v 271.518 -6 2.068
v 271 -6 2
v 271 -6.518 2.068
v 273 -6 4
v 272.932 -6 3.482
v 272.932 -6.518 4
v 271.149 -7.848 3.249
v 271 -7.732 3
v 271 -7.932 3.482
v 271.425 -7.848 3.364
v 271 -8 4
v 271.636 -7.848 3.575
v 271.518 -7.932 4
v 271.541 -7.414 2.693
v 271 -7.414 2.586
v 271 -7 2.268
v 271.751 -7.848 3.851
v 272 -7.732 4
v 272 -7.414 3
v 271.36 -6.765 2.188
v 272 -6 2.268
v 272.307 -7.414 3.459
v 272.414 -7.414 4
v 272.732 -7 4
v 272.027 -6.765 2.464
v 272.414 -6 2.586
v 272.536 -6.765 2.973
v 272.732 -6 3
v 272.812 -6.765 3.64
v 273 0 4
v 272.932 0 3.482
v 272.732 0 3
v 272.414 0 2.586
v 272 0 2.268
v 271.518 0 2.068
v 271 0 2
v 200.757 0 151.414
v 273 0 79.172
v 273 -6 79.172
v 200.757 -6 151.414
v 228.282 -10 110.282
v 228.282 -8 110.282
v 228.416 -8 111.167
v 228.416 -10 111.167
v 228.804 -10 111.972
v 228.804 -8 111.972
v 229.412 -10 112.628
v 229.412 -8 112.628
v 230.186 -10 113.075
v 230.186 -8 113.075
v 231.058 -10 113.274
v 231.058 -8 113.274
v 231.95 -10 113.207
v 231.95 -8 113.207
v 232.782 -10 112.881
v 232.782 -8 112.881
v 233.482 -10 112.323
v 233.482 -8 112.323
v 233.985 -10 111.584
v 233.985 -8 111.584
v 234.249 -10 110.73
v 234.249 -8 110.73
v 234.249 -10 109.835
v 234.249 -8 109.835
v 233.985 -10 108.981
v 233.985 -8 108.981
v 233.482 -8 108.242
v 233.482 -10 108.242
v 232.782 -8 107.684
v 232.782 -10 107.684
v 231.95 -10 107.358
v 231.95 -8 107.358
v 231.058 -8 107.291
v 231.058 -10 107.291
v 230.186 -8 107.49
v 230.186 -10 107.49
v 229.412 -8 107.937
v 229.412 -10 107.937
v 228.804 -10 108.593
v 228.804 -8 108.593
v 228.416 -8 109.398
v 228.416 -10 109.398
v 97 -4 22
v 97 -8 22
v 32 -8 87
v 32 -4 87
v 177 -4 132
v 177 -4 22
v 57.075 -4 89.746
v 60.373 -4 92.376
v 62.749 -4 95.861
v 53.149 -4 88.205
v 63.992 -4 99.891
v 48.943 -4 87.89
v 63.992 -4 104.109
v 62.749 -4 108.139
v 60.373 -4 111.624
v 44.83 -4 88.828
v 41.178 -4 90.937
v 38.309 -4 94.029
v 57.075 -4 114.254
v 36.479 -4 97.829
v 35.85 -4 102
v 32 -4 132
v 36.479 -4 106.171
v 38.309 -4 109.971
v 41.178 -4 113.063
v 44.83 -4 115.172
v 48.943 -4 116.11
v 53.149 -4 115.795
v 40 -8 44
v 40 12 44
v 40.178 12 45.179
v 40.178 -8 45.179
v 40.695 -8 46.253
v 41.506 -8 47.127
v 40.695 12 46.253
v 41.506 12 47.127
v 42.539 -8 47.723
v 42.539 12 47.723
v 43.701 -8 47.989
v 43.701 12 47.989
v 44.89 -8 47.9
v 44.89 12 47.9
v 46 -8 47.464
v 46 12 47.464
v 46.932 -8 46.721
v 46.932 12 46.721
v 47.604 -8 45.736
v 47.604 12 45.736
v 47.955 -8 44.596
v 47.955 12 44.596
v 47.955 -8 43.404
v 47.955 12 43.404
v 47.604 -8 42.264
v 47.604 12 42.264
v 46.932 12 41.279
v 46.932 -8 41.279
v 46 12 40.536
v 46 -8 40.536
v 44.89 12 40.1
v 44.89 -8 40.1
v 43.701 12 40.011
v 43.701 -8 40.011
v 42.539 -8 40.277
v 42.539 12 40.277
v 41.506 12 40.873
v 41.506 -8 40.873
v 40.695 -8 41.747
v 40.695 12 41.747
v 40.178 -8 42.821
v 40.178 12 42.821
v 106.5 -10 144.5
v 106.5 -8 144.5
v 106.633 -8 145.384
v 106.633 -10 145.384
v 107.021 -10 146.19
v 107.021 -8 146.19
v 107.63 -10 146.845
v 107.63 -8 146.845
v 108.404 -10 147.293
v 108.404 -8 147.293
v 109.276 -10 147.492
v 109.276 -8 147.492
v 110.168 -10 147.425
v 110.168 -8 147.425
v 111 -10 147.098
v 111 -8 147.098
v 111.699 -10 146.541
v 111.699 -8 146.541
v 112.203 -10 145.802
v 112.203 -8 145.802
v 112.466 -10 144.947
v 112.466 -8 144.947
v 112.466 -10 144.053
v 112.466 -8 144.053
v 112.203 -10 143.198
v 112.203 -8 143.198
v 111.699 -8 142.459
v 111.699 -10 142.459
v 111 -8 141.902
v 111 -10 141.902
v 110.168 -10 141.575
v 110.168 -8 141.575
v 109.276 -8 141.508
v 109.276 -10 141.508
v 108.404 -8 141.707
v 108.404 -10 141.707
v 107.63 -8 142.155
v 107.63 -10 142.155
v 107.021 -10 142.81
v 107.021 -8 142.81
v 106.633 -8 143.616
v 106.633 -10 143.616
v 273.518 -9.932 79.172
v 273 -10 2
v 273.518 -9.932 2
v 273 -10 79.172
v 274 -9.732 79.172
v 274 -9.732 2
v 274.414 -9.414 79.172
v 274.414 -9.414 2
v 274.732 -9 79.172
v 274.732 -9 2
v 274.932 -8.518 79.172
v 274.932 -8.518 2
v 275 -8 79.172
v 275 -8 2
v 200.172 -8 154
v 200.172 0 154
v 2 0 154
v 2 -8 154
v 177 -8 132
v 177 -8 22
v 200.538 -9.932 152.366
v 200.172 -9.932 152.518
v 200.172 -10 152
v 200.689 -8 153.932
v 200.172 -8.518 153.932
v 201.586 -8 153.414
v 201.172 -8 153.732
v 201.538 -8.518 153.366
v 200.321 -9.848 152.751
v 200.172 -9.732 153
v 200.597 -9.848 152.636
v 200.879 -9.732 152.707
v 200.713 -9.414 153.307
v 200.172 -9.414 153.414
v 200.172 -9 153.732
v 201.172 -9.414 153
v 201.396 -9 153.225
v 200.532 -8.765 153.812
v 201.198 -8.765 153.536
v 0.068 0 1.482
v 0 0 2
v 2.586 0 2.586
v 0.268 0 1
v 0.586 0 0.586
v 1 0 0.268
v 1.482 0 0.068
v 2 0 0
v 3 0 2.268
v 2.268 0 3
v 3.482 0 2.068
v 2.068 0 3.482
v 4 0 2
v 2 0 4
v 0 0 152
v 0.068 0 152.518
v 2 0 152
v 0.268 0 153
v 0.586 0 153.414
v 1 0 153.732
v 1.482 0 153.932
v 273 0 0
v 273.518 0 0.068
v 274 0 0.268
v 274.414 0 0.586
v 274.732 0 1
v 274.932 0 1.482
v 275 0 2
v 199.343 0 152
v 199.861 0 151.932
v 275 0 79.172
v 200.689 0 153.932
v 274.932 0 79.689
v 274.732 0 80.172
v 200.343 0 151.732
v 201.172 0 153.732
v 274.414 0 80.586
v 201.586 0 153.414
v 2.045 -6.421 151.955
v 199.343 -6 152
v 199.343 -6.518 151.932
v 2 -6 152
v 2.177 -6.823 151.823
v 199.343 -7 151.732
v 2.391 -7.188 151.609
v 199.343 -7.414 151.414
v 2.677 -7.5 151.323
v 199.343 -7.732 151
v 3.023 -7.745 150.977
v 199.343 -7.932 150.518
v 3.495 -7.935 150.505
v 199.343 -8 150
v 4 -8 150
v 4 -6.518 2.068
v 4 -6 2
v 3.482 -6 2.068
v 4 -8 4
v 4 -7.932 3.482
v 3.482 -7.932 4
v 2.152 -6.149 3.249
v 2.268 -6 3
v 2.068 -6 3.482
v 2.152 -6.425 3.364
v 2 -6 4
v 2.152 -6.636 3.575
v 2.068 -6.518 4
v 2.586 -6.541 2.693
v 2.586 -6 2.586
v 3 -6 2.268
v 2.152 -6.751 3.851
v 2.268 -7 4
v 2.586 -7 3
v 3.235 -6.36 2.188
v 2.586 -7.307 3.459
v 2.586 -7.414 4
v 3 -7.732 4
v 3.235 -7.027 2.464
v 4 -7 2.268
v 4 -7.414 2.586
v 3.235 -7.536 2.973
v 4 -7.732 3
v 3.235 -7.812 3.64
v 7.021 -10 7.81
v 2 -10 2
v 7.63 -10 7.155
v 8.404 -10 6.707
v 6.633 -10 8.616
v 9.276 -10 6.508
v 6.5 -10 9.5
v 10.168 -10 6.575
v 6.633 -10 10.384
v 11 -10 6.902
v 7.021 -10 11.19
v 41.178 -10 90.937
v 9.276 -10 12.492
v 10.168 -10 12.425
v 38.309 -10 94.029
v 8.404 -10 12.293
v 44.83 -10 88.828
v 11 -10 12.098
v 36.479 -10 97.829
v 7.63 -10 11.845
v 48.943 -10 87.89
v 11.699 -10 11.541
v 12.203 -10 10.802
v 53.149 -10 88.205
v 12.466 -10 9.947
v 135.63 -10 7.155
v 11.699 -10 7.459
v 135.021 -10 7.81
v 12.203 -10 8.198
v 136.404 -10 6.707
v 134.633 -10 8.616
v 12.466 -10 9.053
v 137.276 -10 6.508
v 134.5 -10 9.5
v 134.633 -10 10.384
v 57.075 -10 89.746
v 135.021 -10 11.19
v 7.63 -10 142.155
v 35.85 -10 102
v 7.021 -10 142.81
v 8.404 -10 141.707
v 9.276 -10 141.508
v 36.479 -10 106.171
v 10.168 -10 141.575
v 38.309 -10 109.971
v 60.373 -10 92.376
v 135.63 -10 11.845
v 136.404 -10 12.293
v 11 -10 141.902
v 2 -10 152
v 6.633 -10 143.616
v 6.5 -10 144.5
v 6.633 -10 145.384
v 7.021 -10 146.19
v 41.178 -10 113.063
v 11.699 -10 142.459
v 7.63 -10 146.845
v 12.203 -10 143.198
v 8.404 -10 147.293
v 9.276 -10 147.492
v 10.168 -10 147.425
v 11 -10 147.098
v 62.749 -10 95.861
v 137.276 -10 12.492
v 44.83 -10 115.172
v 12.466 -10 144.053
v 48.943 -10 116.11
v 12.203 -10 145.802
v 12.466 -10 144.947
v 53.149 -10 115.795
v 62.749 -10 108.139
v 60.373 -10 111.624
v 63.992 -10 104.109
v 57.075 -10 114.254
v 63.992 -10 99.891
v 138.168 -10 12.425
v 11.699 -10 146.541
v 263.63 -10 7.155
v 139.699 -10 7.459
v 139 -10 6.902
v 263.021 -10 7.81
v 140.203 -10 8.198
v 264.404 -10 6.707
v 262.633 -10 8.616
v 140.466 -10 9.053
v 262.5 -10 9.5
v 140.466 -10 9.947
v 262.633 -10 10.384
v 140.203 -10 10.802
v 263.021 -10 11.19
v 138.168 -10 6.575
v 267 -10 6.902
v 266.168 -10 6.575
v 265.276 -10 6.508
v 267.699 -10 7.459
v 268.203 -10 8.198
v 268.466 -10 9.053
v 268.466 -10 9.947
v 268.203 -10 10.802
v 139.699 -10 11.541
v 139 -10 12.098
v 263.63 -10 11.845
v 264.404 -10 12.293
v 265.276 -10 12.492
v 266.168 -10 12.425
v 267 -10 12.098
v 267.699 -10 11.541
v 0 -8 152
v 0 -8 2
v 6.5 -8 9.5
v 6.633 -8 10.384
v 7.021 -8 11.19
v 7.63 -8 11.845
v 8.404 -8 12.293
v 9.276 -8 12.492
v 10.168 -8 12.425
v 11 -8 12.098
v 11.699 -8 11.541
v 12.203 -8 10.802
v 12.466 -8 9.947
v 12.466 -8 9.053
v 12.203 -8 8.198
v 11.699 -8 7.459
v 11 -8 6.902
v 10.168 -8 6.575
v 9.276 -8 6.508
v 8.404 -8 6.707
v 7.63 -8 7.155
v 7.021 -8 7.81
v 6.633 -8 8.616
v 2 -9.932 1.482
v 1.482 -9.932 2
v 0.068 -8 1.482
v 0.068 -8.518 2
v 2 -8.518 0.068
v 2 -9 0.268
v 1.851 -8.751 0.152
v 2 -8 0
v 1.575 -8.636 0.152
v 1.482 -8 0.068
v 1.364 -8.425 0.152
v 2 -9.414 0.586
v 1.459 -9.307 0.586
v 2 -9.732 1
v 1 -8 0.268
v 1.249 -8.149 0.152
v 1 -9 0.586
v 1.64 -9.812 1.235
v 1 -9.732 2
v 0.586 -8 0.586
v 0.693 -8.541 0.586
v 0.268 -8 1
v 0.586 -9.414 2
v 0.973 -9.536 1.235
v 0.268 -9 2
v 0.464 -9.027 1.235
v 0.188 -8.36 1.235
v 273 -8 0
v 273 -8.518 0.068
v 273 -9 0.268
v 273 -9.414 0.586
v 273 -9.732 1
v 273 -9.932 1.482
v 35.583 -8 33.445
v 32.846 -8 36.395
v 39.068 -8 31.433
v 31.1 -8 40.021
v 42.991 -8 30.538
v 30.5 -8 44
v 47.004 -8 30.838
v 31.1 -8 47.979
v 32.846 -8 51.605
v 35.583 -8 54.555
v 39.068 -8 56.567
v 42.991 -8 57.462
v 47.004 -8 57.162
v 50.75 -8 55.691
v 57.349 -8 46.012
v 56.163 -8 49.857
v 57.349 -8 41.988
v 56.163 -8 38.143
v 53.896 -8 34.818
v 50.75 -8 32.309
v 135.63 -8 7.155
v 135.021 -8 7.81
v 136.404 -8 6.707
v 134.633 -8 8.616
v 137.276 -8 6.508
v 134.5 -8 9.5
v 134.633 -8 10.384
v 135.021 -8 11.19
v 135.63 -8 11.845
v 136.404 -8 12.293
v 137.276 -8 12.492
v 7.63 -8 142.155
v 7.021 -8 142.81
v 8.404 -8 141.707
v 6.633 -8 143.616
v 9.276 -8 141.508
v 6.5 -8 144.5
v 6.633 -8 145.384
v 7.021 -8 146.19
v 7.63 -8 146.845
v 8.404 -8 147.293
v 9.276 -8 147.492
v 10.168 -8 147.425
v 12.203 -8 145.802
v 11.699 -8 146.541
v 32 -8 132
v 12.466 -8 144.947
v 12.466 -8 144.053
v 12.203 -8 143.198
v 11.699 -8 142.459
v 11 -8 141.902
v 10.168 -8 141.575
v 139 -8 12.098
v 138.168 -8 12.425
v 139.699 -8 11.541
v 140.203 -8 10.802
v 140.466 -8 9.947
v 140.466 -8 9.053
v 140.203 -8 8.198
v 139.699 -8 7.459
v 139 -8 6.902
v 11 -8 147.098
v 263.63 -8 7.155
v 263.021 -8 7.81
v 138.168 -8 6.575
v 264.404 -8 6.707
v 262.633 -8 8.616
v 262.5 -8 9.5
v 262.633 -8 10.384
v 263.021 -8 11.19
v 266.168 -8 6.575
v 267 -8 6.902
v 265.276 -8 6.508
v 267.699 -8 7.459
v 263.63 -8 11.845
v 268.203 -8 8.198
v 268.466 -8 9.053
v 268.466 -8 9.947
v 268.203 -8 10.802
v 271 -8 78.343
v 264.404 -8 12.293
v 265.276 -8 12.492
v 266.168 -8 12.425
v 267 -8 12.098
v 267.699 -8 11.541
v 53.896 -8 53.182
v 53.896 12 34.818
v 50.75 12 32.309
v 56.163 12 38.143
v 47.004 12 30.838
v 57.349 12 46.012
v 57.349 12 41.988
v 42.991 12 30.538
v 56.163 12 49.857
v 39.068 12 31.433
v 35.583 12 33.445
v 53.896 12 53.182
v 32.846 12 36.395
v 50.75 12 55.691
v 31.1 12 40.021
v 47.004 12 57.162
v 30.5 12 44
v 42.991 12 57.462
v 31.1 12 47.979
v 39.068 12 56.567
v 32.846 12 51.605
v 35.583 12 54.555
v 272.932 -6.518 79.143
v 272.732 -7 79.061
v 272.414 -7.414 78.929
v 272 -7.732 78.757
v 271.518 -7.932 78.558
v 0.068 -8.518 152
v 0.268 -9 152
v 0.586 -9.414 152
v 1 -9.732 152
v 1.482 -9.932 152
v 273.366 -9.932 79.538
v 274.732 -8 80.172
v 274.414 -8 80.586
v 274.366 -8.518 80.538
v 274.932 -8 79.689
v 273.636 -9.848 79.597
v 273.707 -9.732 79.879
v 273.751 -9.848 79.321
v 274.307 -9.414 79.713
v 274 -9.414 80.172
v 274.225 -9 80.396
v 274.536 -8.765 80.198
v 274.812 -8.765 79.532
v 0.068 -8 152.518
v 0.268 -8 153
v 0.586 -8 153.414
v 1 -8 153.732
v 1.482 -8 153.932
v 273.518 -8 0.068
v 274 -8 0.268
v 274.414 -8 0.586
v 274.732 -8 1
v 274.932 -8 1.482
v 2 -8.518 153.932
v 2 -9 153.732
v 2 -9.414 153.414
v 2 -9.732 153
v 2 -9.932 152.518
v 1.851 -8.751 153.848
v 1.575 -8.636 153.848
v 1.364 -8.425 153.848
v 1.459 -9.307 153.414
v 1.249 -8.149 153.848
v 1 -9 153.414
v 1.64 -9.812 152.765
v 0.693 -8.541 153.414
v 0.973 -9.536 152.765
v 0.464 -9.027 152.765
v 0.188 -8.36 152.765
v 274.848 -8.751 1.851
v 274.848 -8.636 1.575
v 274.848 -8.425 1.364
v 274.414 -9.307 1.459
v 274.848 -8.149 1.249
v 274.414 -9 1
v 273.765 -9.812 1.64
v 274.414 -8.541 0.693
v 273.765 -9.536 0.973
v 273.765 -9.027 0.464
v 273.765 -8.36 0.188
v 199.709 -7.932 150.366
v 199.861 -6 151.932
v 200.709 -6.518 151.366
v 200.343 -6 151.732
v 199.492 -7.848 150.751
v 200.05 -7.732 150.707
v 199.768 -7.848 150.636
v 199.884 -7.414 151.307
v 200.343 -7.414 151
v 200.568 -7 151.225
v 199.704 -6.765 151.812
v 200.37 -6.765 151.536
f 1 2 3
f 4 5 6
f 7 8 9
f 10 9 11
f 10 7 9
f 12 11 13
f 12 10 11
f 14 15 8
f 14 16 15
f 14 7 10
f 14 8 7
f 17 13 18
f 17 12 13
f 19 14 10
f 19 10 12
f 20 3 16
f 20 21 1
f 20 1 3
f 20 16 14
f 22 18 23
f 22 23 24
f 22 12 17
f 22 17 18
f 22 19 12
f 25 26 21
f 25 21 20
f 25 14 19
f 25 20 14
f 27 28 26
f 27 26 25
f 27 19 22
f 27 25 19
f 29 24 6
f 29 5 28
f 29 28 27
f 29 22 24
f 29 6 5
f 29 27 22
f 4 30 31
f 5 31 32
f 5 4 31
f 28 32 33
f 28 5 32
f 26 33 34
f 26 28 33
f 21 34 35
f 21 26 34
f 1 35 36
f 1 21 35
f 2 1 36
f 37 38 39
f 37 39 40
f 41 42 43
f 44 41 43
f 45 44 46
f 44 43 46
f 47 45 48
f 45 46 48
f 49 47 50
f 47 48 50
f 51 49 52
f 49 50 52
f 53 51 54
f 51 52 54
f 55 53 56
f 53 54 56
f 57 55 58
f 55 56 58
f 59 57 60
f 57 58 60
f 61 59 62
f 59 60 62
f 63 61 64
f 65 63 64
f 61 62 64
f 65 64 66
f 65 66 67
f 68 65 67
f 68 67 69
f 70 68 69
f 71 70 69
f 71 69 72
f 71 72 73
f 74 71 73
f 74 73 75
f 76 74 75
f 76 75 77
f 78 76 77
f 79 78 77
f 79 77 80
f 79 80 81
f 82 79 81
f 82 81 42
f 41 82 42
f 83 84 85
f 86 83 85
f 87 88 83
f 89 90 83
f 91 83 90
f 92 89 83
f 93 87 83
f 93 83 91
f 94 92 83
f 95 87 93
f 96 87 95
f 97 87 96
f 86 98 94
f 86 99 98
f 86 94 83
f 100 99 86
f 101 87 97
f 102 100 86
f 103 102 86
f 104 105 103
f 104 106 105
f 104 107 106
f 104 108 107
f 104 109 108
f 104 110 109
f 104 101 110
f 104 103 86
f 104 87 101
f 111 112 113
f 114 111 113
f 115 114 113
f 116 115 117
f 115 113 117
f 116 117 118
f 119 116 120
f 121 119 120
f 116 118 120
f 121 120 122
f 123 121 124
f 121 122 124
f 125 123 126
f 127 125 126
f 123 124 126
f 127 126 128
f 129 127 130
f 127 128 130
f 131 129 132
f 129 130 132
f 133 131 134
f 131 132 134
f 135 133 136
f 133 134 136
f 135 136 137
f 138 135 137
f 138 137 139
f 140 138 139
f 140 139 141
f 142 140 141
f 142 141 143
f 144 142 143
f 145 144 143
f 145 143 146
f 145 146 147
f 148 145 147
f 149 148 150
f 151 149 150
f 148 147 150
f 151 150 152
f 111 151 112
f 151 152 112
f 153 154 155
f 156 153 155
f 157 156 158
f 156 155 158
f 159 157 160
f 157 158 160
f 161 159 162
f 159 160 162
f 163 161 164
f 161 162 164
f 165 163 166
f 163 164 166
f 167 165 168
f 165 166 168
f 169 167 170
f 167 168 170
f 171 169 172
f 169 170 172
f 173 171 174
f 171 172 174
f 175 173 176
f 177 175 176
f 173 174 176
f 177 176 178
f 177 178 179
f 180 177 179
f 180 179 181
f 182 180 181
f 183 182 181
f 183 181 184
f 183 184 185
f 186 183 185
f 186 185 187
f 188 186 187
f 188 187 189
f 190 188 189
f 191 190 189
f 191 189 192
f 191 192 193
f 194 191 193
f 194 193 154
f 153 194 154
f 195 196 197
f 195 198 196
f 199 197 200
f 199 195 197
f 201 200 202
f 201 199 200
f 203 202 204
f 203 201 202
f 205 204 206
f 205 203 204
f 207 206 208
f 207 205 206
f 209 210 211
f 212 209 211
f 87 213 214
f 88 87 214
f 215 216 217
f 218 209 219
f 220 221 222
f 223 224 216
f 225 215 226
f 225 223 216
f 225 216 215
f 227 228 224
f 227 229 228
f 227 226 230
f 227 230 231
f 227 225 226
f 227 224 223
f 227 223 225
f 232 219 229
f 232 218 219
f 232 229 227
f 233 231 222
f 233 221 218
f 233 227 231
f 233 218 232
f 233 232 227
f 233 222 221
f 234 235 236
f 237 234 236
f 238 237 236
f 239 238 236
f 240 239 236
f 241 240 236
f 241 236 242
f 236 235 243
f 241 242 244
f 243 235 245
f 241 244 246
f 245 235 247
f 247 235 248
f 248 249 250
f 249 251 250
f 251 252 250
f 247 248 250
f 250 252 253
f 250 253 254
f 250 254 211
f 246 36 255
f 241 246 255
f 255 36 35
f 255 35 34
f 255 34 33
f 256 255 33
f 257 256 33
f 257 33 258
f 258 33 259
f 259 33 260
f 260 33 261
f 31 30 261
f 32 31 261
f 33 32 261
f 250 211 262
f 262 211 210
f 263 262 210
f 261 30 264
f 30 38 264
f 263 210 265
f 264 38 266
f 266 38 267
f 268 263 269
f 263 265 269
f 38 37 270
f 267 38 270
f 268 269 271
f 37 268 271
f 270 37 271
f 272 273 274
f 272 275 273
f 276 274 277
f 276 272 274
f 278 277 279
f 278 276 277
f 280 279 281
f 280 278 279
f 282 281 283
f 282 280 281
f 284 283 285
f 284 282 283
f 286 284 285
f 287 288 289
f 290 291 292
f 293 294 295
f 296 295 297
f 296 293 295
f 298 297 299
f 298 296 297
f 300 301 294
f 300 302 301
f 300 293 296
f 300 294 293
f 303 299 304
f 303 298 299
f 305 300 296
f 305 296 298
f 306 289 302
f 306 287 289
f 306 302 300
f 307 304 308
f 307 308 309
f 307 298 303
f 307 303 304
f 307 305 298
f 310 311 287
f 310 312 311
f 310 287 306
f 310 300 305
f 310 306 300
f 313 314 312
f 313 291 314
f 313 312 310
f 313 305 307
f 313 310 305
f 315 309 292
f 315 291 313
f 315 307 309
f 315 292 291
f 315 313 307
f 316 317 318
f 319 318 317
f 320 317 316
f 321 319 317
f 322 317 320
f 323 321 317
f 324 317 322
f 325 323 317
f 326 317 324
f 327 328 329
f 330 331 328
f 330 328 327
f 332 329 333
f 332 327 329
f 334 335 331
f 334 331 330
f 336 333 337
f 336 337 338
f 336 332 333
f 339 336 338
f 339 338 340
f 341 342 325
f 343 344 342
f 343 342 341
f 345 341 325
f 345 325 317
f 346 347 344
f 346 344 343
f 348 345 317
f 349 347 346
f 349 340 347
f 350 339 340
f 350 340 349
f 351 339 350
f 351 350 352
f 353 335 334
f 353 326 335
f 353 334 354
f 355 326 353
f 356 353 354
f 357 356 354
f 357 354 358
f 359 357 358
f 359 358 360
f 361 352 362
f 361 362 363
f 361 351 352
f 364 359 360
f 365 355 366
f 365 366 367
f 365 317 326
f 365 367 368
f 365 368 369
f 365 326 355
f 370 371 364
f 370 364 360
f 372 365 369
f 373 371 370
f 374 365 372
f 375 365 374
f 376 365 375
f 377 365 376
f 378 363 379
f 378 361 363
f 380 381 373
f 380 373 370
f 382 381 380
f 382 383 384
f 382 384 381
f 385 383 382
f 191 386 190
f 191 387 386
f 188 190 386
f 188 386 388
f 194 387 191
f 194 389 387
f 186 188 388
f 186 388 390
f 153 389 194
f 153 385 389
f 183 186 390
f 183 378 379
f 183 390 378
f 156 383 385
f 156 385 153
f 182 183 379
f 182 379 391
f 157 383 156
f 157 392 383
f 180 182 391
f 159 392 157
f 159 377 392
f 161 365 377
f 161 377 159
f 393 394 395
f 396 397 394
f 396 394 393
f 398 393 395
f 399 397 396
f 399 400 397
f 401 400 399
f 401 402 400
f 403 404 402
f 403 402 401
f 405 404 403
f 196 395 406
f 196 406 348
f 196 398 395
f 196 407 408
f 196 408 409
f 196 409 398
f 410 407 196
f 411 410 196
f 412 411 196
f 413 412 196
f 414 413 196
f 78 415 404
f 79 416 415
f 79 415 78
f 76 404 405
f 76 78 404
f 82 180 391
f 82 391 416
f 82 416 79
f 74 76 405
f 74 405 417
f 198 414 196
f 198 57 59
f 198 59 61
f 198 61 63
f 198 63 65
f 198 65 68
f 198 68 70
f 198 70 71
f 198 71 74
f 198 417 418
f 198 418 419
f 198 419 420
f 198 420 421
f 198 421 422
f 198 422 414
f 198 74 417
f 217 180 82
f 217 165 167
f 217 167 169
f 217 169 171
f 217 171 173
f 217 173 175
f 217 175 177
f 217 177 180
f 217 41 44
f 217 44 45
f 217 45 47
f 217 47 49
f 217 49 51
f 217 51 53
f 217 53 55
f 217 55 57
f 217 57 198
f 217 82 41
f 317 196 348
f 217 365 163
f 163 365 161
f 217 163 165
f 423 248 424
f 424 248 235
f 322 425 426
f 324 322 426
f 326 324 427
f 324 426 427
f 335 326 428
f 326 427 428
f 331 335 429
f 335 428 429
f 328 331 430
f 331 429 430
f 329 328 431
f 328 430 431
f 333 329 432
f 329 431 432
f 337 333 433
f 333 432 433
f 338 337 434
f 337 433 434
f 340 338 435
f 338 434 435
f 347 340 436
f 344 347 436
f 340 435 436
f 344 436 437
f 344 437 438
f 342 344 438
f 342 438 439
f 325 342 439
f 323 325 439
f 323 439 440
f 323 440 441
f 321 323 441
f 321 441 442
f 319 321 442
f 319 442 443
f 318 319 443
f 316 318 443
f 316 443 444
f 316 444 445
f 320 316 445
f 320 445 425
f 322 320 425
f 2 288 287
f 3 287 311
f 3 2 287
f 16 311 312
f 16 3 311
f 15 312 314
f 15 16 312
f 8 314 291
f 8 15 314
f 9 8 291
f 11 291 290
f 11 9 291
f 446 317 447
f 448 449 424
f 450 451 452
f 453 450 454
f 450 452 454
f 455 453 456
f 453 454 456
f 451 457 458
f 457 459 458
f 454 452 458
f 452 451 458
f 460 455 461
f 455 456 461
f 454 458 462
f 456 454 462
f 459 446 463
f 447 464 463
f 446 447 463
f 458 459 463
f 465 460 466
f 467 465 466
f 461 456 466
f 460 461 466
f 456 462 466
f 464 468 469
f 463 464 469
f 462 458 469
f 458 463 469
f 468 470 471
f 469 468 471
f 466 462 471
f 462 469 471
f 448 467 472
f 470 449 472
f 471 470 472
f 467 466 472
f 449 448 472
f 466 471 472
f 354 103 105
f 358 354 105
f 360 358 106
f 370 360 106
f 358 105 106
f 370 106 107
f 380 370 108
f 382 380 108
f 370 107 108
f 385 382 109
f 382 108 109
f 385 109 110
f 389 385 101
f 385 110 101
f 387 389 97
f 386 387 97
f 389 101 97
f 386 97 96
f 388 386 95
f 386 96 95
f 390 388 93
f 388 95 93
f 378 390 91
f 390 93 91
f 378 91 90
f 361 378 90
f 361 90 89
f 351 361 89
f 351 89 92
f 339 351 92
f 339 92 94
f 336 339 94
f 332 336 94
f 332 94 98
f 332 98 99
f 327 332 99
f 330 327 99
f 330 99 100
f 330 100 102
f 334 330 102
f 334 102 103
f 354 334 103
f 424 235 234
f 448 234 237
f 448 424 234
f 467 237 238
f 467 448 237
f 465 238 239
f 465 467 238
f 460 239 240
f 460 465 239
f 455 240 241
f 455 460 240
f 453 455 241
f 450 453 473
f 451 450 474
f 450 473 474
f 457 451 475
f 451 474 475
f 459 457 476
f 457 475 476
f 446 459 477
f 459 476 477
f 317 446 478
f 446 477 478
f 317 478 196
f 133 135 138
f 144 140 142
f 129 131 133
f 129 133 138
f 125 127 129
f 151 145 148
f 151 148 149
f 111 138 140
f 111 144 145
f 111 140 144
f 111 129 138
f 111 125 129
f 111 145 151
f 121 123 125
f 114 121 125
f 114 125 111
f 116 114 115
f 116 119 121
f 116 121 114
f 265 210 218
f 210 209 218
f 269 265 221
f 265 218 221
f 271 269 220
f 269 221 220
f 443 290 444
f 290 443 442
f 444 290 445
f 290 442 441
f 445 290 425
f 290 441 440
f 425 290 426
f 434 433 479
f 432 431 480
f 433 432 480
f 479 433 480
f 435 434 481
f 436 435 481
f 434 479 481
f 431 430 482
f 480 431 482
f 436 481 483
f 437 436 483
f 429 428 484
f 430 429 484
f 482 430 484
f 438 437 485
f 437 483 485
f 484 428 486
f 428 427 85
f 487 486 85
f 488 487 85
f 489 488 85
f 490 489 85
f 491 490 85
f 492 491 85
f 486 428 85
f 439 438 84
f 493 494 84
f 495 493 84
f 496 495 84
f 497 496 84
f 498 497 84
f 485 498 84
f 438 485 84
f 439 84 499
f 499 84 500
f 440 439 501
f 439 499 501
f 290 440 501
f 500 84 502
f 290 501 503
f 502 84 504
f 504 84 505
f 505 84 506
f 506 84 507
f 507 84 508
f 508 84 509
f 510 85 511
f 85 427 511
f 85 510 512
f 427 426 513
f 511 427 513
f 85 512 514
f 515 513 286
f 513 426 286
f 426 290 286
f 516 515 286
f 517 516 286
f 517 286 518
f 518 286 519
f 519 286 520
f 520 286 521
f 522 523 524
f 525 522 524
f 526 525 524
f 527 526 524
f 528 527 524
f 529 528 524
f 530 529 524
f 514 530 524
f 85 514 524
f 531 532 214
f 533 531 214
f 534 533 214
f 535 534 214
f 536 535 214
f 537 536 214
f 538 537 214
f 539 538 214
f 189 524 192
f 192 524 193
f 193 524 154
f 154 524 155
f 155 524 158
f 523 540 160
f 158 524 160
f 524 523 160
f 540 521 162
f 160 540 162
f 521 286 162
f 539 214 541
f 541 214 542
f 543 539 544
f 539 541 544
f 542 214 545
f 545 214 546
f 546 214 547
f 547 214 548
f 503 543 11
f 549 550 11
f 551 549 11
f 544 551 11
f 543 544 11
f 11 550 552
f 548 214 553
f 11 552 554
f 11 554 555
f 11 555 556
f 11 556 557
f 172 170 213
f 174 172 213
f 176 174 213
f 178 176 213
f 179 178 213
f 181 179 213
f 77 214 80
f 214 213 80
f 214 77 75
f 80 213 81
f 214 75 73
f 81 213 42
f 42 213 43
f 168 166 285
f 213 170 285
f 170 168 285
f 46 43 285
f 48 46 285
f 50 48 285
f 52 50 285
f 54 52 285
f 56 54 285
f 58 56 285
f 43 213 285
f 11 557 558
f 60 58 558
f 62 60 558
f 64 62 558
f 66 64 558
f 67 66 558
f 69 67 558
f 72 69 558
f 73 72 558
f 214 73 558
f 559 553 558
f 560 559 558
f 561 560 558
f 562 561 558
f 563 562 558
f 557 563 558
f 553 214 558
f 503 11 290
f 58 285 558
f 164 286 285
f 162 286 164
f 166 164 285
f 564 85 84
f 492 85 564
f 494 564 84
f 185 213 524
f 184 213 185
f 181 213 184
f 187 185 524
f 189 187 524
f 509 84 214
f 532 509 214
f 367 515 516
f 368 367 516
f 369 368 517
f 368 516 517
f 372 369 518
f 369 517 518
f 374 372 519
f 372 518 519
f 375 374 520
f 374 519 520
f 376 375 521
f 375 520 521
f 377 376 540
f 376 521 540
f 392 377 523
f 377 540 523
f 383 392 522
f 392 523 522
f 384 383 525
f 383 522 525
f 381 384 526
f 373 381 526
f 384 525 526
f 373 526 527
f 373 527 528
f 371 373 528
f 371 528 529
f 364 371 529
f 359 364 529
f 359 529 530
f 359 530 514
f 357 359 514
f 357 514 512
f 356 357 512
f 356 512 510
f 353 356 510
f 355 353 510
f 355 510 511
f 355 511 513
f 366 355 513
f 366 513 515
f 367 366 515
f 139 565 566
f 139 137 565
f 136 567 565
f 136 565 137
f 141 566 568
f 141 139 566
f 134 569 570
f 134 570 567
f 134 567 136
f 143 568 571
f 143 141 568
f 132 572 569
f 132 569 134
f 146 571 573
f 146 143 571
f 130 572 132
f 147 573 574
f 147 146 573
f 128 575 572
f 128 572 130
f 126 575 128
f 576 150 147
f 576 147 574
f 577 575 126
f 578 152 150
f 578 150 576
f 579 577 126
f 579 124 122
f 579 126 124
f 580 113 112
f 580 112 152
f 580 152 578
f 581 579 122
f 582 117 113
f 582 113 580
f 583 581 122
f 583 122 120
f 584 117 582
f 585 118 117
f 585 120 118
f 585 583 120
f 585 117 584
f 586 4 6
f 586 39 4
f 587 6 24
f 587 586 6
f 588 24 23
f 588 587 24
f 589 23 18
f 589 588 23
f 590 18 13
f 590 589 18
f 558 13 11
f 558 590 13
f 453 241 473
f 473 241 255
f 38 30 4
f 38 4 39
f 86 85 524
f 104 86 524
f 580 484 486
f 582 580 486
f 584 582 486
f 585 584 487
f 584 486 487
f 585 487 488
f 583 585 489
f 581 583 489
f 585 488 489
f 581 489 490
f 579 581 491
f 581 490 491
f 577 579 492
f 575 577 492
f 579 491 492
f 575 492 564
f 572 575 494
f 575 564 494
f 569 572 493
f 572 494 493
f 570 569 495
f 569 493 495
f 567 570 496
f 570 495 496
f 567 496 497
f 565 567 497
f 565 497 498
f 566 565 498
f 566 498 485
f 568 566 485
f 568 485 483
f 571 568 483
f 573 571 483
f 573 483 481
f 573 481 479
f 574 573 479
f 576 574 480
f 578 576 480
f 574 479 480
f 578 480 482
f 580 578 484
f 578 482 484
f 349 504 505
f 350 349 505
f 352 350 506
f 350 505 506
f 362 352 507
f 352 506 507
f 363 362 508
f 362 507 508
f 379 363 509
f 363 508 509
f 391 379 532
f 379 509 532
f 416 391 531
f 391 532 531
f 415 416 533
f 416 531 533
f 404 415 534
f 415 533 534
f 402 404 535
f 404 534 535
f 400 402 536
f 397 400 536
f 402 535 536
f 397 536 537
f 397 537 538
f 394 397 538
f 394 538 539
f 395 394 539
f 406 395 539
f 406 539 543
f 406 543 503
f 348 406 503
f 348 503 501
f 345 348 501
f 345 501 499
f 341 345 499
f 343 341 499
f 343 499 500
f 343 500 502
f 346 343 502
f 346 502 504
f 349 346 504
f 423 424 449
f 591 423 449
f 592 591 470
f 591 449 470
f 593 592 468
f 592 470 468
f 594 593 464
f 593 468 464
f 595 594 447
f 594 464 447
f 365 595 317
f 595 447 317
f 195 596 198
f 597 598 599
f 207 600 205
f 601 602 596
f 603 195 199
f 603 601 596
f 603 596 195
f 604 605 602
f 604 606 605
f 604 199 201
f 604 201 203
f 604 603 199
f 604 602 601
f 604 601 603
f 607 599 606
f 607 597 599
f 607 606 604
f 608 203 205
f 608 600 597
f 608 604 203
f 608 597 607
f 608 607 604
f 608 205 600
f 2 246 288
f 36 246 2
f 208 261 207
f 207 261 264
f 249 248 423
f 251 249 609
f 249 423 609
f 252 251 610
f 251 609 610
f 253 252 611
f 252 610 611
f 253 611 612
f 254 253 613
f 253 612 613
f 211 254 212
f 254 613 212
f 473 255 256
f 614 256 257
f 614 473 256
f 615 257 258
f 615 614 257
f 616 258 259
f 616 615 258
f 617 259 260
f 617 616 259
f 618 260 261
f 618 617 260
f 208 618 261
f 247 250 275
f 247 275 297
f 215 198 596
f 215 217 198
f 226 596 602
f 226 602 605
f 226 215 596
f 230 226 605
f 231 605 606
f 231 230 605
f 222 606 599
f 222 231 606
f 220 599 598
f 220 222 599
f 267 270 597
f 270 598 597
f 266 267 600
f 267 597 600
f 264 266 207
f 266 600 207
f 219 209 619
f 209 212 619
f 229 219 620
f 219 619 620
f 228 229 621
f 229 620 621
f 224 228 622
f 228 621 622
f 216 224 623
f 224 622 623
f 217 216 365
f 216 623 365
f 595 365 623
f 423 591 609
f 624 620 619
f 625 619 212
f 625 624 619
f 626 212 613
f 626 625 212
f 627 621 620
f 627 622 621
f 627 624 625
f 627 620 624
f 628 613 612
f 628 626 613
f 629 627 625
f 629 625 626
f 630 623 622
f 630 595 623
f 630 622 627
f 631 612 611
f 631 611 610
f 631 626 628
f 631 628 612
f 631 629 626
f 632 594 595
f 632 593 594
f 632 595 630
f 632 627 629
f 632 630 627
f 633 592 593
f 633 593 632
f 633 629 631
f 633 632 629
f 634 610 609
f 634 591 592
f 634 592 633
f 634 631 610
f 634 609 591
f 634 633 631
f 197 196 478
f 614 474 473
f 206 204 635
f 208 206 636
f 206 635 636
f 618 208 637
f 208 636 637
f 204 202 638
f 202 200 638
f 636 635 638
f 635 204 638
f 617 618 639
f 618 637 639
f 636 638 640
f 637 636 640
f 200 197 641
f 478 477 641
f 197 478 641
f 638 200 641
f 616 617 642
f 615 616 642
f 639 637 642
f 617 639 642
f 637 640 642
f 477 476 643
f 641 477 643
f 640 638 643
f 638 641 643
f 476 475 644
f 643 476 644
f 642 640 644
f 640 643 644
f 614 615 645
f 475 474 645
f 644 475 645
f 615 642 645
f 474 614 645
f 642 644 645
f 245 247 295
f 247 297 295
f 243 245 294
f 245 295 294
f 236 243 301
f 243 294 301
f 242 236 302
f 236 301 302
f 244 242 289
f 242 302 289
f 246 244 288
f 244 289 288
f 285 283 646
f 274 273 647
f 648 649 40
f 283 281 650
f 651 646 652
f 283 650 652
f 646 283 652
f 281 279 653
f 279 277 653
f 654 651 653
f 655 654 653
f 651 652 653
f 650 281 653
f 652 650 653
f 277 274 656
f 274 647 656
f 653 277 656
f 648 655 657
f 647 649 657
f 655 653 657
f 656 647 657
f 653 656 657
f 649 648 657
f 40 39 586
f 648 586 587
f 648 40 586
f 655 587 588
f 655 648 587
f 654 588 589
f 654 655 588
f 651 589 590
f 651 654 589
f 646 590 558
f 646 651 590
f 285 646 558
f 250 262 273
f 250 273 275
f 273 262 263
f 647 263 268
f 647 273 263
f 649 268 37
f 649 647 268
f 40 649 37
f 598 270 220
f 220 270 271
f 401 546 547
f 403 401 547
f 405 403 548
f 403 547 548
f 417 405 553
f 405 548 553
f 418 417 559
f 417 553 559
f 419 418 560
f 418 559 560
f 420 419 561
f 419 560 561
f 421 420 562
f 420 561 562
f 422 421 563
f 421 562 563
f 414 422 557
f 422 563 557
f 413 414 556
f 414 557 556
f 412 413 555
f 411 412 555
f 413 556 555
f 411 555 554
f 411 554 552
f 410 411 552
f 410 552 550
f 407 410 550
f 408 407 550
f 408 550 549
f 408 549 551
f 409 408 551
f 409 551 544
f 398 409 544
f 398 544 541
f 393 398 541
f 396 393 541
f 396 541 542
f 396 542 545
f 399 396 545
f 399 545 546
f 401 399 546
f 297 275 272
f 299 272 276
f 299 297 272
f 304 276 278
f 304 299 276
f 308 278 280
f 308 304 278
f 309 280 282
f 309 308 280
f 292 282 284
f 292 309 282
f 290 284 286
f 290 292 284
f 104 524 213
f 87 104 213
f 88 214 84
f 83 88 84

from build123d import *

# Parameters (mm, degrees)
F1_DEPTH  = 10
F2_T      = -2
F4_DEPTH  = 4
F5_R      = 13.5
F6_DEPTH  = 20
F7_R      = 4
F8_DEPTH  = 20
F10_D     = 6
F11_R     = 2
F12_R     = 2
F13_R     = 14.15
F14_DEPTH = 6.001


with BuildPart() as f1:
    # F0 (on Front) → F1 (new body)
    with BuildSketch(Plane.XZ):
        Polygon((0, 154), (0, 0), (275, 0), (275, 80), (201, 154), align=None)
    extrude(amount=F1_DEPTH)

    # F2
    f2_openings = [f1.faces().sort_by_distance(p)[0] for p in [
        (129.700907, 0, 73.382695),
    ]]
    offset(amount=F2_T, openings=f2_openings)

    # F3 (on face) → F4 (join)
    with BuildSketch(Plane(origin=(0, -8, 0), x_dir=(-1, 0, 0), z_dir=(0, 1, 0))):
        Polygon((-32, 87), (-32, 132), (-177, 132), (-177, 22), (-97, 22), align=None)
    extrude(amount=F4_DEPTH)

    # F5 (on face) → F6 (join)
    with BuildSketch(Plane(origin=(0, -8, 0), x_dir=(-1, 0, 0), z_dir=(0, 1, 0))):
        with Locations((-44, 44)):
            Circle(F5_R)
    extrude(amount=F6_DEPTH)

    # F7 (on face) → F8 (cut, through all)
    with BuildSketch(Plane(origin=(0, 12, 0), x_dir=(-1, 0, 0), z_dir=(0, 1, 0))):
        with Locations((-44, 44)):
            Circle(F7_R)
    extrude(amount=-F8_DEPTH, mode=Mode.SUBTRACT)

    # F10 (through all)
    with Locations(Plane.XZ.offset(10)):
        with Locations((9.5, 144.5), (109.5, 144.5), (231.2824855787, 110.2824855787), (265.5, 9.5), (137.5, 9.5), (9.5, 9.5)):
            Hole(F10_D / 2)

    # F11
    f11_edges = [f1.edges().sort_by_distance(p)[0] for p in [
        (0, -10, 77),
        (137.5, -10, 0),
        (238, -10, 117),
        (275, -10, 40),
        (275, -5, 0),
        (275, -5, 80),
        (201, -5, 154),
        (0, -5, 0),
        (100.5, -10, 154),
        (0, -5, 154),
    ]]
    fillet(f11_edges, radius=F11_R)

    # F12
    f12_edges = [f1.edges().sort_by_distance(p)[0] for p in [
        (273, -4, 2),
        (137.5, -8, 2),
        (273, -8, 40.585786),
        (236.585786, -8, 115.585786),
        (200.171573, -4, 152),
        (101.085786, -8, 152),
        (2, -4, 2),
        (2, -8, 77),
    ]]
    fillet(f12_edges, radius=F12_R)

    # F13 (on face) → F14 (cut, through all)
    with BuildSketch(Plane(origin=(0, -4, 0), x_dir=(-1, 0, 0), z_dir=(0, 1, 0))):
        with Locations((-50, 102)):
            Circle(F13_R)
    extrude(amount=-F14_DEPTH, mode=Mode.SUBTRACT)


solid = f1.part
